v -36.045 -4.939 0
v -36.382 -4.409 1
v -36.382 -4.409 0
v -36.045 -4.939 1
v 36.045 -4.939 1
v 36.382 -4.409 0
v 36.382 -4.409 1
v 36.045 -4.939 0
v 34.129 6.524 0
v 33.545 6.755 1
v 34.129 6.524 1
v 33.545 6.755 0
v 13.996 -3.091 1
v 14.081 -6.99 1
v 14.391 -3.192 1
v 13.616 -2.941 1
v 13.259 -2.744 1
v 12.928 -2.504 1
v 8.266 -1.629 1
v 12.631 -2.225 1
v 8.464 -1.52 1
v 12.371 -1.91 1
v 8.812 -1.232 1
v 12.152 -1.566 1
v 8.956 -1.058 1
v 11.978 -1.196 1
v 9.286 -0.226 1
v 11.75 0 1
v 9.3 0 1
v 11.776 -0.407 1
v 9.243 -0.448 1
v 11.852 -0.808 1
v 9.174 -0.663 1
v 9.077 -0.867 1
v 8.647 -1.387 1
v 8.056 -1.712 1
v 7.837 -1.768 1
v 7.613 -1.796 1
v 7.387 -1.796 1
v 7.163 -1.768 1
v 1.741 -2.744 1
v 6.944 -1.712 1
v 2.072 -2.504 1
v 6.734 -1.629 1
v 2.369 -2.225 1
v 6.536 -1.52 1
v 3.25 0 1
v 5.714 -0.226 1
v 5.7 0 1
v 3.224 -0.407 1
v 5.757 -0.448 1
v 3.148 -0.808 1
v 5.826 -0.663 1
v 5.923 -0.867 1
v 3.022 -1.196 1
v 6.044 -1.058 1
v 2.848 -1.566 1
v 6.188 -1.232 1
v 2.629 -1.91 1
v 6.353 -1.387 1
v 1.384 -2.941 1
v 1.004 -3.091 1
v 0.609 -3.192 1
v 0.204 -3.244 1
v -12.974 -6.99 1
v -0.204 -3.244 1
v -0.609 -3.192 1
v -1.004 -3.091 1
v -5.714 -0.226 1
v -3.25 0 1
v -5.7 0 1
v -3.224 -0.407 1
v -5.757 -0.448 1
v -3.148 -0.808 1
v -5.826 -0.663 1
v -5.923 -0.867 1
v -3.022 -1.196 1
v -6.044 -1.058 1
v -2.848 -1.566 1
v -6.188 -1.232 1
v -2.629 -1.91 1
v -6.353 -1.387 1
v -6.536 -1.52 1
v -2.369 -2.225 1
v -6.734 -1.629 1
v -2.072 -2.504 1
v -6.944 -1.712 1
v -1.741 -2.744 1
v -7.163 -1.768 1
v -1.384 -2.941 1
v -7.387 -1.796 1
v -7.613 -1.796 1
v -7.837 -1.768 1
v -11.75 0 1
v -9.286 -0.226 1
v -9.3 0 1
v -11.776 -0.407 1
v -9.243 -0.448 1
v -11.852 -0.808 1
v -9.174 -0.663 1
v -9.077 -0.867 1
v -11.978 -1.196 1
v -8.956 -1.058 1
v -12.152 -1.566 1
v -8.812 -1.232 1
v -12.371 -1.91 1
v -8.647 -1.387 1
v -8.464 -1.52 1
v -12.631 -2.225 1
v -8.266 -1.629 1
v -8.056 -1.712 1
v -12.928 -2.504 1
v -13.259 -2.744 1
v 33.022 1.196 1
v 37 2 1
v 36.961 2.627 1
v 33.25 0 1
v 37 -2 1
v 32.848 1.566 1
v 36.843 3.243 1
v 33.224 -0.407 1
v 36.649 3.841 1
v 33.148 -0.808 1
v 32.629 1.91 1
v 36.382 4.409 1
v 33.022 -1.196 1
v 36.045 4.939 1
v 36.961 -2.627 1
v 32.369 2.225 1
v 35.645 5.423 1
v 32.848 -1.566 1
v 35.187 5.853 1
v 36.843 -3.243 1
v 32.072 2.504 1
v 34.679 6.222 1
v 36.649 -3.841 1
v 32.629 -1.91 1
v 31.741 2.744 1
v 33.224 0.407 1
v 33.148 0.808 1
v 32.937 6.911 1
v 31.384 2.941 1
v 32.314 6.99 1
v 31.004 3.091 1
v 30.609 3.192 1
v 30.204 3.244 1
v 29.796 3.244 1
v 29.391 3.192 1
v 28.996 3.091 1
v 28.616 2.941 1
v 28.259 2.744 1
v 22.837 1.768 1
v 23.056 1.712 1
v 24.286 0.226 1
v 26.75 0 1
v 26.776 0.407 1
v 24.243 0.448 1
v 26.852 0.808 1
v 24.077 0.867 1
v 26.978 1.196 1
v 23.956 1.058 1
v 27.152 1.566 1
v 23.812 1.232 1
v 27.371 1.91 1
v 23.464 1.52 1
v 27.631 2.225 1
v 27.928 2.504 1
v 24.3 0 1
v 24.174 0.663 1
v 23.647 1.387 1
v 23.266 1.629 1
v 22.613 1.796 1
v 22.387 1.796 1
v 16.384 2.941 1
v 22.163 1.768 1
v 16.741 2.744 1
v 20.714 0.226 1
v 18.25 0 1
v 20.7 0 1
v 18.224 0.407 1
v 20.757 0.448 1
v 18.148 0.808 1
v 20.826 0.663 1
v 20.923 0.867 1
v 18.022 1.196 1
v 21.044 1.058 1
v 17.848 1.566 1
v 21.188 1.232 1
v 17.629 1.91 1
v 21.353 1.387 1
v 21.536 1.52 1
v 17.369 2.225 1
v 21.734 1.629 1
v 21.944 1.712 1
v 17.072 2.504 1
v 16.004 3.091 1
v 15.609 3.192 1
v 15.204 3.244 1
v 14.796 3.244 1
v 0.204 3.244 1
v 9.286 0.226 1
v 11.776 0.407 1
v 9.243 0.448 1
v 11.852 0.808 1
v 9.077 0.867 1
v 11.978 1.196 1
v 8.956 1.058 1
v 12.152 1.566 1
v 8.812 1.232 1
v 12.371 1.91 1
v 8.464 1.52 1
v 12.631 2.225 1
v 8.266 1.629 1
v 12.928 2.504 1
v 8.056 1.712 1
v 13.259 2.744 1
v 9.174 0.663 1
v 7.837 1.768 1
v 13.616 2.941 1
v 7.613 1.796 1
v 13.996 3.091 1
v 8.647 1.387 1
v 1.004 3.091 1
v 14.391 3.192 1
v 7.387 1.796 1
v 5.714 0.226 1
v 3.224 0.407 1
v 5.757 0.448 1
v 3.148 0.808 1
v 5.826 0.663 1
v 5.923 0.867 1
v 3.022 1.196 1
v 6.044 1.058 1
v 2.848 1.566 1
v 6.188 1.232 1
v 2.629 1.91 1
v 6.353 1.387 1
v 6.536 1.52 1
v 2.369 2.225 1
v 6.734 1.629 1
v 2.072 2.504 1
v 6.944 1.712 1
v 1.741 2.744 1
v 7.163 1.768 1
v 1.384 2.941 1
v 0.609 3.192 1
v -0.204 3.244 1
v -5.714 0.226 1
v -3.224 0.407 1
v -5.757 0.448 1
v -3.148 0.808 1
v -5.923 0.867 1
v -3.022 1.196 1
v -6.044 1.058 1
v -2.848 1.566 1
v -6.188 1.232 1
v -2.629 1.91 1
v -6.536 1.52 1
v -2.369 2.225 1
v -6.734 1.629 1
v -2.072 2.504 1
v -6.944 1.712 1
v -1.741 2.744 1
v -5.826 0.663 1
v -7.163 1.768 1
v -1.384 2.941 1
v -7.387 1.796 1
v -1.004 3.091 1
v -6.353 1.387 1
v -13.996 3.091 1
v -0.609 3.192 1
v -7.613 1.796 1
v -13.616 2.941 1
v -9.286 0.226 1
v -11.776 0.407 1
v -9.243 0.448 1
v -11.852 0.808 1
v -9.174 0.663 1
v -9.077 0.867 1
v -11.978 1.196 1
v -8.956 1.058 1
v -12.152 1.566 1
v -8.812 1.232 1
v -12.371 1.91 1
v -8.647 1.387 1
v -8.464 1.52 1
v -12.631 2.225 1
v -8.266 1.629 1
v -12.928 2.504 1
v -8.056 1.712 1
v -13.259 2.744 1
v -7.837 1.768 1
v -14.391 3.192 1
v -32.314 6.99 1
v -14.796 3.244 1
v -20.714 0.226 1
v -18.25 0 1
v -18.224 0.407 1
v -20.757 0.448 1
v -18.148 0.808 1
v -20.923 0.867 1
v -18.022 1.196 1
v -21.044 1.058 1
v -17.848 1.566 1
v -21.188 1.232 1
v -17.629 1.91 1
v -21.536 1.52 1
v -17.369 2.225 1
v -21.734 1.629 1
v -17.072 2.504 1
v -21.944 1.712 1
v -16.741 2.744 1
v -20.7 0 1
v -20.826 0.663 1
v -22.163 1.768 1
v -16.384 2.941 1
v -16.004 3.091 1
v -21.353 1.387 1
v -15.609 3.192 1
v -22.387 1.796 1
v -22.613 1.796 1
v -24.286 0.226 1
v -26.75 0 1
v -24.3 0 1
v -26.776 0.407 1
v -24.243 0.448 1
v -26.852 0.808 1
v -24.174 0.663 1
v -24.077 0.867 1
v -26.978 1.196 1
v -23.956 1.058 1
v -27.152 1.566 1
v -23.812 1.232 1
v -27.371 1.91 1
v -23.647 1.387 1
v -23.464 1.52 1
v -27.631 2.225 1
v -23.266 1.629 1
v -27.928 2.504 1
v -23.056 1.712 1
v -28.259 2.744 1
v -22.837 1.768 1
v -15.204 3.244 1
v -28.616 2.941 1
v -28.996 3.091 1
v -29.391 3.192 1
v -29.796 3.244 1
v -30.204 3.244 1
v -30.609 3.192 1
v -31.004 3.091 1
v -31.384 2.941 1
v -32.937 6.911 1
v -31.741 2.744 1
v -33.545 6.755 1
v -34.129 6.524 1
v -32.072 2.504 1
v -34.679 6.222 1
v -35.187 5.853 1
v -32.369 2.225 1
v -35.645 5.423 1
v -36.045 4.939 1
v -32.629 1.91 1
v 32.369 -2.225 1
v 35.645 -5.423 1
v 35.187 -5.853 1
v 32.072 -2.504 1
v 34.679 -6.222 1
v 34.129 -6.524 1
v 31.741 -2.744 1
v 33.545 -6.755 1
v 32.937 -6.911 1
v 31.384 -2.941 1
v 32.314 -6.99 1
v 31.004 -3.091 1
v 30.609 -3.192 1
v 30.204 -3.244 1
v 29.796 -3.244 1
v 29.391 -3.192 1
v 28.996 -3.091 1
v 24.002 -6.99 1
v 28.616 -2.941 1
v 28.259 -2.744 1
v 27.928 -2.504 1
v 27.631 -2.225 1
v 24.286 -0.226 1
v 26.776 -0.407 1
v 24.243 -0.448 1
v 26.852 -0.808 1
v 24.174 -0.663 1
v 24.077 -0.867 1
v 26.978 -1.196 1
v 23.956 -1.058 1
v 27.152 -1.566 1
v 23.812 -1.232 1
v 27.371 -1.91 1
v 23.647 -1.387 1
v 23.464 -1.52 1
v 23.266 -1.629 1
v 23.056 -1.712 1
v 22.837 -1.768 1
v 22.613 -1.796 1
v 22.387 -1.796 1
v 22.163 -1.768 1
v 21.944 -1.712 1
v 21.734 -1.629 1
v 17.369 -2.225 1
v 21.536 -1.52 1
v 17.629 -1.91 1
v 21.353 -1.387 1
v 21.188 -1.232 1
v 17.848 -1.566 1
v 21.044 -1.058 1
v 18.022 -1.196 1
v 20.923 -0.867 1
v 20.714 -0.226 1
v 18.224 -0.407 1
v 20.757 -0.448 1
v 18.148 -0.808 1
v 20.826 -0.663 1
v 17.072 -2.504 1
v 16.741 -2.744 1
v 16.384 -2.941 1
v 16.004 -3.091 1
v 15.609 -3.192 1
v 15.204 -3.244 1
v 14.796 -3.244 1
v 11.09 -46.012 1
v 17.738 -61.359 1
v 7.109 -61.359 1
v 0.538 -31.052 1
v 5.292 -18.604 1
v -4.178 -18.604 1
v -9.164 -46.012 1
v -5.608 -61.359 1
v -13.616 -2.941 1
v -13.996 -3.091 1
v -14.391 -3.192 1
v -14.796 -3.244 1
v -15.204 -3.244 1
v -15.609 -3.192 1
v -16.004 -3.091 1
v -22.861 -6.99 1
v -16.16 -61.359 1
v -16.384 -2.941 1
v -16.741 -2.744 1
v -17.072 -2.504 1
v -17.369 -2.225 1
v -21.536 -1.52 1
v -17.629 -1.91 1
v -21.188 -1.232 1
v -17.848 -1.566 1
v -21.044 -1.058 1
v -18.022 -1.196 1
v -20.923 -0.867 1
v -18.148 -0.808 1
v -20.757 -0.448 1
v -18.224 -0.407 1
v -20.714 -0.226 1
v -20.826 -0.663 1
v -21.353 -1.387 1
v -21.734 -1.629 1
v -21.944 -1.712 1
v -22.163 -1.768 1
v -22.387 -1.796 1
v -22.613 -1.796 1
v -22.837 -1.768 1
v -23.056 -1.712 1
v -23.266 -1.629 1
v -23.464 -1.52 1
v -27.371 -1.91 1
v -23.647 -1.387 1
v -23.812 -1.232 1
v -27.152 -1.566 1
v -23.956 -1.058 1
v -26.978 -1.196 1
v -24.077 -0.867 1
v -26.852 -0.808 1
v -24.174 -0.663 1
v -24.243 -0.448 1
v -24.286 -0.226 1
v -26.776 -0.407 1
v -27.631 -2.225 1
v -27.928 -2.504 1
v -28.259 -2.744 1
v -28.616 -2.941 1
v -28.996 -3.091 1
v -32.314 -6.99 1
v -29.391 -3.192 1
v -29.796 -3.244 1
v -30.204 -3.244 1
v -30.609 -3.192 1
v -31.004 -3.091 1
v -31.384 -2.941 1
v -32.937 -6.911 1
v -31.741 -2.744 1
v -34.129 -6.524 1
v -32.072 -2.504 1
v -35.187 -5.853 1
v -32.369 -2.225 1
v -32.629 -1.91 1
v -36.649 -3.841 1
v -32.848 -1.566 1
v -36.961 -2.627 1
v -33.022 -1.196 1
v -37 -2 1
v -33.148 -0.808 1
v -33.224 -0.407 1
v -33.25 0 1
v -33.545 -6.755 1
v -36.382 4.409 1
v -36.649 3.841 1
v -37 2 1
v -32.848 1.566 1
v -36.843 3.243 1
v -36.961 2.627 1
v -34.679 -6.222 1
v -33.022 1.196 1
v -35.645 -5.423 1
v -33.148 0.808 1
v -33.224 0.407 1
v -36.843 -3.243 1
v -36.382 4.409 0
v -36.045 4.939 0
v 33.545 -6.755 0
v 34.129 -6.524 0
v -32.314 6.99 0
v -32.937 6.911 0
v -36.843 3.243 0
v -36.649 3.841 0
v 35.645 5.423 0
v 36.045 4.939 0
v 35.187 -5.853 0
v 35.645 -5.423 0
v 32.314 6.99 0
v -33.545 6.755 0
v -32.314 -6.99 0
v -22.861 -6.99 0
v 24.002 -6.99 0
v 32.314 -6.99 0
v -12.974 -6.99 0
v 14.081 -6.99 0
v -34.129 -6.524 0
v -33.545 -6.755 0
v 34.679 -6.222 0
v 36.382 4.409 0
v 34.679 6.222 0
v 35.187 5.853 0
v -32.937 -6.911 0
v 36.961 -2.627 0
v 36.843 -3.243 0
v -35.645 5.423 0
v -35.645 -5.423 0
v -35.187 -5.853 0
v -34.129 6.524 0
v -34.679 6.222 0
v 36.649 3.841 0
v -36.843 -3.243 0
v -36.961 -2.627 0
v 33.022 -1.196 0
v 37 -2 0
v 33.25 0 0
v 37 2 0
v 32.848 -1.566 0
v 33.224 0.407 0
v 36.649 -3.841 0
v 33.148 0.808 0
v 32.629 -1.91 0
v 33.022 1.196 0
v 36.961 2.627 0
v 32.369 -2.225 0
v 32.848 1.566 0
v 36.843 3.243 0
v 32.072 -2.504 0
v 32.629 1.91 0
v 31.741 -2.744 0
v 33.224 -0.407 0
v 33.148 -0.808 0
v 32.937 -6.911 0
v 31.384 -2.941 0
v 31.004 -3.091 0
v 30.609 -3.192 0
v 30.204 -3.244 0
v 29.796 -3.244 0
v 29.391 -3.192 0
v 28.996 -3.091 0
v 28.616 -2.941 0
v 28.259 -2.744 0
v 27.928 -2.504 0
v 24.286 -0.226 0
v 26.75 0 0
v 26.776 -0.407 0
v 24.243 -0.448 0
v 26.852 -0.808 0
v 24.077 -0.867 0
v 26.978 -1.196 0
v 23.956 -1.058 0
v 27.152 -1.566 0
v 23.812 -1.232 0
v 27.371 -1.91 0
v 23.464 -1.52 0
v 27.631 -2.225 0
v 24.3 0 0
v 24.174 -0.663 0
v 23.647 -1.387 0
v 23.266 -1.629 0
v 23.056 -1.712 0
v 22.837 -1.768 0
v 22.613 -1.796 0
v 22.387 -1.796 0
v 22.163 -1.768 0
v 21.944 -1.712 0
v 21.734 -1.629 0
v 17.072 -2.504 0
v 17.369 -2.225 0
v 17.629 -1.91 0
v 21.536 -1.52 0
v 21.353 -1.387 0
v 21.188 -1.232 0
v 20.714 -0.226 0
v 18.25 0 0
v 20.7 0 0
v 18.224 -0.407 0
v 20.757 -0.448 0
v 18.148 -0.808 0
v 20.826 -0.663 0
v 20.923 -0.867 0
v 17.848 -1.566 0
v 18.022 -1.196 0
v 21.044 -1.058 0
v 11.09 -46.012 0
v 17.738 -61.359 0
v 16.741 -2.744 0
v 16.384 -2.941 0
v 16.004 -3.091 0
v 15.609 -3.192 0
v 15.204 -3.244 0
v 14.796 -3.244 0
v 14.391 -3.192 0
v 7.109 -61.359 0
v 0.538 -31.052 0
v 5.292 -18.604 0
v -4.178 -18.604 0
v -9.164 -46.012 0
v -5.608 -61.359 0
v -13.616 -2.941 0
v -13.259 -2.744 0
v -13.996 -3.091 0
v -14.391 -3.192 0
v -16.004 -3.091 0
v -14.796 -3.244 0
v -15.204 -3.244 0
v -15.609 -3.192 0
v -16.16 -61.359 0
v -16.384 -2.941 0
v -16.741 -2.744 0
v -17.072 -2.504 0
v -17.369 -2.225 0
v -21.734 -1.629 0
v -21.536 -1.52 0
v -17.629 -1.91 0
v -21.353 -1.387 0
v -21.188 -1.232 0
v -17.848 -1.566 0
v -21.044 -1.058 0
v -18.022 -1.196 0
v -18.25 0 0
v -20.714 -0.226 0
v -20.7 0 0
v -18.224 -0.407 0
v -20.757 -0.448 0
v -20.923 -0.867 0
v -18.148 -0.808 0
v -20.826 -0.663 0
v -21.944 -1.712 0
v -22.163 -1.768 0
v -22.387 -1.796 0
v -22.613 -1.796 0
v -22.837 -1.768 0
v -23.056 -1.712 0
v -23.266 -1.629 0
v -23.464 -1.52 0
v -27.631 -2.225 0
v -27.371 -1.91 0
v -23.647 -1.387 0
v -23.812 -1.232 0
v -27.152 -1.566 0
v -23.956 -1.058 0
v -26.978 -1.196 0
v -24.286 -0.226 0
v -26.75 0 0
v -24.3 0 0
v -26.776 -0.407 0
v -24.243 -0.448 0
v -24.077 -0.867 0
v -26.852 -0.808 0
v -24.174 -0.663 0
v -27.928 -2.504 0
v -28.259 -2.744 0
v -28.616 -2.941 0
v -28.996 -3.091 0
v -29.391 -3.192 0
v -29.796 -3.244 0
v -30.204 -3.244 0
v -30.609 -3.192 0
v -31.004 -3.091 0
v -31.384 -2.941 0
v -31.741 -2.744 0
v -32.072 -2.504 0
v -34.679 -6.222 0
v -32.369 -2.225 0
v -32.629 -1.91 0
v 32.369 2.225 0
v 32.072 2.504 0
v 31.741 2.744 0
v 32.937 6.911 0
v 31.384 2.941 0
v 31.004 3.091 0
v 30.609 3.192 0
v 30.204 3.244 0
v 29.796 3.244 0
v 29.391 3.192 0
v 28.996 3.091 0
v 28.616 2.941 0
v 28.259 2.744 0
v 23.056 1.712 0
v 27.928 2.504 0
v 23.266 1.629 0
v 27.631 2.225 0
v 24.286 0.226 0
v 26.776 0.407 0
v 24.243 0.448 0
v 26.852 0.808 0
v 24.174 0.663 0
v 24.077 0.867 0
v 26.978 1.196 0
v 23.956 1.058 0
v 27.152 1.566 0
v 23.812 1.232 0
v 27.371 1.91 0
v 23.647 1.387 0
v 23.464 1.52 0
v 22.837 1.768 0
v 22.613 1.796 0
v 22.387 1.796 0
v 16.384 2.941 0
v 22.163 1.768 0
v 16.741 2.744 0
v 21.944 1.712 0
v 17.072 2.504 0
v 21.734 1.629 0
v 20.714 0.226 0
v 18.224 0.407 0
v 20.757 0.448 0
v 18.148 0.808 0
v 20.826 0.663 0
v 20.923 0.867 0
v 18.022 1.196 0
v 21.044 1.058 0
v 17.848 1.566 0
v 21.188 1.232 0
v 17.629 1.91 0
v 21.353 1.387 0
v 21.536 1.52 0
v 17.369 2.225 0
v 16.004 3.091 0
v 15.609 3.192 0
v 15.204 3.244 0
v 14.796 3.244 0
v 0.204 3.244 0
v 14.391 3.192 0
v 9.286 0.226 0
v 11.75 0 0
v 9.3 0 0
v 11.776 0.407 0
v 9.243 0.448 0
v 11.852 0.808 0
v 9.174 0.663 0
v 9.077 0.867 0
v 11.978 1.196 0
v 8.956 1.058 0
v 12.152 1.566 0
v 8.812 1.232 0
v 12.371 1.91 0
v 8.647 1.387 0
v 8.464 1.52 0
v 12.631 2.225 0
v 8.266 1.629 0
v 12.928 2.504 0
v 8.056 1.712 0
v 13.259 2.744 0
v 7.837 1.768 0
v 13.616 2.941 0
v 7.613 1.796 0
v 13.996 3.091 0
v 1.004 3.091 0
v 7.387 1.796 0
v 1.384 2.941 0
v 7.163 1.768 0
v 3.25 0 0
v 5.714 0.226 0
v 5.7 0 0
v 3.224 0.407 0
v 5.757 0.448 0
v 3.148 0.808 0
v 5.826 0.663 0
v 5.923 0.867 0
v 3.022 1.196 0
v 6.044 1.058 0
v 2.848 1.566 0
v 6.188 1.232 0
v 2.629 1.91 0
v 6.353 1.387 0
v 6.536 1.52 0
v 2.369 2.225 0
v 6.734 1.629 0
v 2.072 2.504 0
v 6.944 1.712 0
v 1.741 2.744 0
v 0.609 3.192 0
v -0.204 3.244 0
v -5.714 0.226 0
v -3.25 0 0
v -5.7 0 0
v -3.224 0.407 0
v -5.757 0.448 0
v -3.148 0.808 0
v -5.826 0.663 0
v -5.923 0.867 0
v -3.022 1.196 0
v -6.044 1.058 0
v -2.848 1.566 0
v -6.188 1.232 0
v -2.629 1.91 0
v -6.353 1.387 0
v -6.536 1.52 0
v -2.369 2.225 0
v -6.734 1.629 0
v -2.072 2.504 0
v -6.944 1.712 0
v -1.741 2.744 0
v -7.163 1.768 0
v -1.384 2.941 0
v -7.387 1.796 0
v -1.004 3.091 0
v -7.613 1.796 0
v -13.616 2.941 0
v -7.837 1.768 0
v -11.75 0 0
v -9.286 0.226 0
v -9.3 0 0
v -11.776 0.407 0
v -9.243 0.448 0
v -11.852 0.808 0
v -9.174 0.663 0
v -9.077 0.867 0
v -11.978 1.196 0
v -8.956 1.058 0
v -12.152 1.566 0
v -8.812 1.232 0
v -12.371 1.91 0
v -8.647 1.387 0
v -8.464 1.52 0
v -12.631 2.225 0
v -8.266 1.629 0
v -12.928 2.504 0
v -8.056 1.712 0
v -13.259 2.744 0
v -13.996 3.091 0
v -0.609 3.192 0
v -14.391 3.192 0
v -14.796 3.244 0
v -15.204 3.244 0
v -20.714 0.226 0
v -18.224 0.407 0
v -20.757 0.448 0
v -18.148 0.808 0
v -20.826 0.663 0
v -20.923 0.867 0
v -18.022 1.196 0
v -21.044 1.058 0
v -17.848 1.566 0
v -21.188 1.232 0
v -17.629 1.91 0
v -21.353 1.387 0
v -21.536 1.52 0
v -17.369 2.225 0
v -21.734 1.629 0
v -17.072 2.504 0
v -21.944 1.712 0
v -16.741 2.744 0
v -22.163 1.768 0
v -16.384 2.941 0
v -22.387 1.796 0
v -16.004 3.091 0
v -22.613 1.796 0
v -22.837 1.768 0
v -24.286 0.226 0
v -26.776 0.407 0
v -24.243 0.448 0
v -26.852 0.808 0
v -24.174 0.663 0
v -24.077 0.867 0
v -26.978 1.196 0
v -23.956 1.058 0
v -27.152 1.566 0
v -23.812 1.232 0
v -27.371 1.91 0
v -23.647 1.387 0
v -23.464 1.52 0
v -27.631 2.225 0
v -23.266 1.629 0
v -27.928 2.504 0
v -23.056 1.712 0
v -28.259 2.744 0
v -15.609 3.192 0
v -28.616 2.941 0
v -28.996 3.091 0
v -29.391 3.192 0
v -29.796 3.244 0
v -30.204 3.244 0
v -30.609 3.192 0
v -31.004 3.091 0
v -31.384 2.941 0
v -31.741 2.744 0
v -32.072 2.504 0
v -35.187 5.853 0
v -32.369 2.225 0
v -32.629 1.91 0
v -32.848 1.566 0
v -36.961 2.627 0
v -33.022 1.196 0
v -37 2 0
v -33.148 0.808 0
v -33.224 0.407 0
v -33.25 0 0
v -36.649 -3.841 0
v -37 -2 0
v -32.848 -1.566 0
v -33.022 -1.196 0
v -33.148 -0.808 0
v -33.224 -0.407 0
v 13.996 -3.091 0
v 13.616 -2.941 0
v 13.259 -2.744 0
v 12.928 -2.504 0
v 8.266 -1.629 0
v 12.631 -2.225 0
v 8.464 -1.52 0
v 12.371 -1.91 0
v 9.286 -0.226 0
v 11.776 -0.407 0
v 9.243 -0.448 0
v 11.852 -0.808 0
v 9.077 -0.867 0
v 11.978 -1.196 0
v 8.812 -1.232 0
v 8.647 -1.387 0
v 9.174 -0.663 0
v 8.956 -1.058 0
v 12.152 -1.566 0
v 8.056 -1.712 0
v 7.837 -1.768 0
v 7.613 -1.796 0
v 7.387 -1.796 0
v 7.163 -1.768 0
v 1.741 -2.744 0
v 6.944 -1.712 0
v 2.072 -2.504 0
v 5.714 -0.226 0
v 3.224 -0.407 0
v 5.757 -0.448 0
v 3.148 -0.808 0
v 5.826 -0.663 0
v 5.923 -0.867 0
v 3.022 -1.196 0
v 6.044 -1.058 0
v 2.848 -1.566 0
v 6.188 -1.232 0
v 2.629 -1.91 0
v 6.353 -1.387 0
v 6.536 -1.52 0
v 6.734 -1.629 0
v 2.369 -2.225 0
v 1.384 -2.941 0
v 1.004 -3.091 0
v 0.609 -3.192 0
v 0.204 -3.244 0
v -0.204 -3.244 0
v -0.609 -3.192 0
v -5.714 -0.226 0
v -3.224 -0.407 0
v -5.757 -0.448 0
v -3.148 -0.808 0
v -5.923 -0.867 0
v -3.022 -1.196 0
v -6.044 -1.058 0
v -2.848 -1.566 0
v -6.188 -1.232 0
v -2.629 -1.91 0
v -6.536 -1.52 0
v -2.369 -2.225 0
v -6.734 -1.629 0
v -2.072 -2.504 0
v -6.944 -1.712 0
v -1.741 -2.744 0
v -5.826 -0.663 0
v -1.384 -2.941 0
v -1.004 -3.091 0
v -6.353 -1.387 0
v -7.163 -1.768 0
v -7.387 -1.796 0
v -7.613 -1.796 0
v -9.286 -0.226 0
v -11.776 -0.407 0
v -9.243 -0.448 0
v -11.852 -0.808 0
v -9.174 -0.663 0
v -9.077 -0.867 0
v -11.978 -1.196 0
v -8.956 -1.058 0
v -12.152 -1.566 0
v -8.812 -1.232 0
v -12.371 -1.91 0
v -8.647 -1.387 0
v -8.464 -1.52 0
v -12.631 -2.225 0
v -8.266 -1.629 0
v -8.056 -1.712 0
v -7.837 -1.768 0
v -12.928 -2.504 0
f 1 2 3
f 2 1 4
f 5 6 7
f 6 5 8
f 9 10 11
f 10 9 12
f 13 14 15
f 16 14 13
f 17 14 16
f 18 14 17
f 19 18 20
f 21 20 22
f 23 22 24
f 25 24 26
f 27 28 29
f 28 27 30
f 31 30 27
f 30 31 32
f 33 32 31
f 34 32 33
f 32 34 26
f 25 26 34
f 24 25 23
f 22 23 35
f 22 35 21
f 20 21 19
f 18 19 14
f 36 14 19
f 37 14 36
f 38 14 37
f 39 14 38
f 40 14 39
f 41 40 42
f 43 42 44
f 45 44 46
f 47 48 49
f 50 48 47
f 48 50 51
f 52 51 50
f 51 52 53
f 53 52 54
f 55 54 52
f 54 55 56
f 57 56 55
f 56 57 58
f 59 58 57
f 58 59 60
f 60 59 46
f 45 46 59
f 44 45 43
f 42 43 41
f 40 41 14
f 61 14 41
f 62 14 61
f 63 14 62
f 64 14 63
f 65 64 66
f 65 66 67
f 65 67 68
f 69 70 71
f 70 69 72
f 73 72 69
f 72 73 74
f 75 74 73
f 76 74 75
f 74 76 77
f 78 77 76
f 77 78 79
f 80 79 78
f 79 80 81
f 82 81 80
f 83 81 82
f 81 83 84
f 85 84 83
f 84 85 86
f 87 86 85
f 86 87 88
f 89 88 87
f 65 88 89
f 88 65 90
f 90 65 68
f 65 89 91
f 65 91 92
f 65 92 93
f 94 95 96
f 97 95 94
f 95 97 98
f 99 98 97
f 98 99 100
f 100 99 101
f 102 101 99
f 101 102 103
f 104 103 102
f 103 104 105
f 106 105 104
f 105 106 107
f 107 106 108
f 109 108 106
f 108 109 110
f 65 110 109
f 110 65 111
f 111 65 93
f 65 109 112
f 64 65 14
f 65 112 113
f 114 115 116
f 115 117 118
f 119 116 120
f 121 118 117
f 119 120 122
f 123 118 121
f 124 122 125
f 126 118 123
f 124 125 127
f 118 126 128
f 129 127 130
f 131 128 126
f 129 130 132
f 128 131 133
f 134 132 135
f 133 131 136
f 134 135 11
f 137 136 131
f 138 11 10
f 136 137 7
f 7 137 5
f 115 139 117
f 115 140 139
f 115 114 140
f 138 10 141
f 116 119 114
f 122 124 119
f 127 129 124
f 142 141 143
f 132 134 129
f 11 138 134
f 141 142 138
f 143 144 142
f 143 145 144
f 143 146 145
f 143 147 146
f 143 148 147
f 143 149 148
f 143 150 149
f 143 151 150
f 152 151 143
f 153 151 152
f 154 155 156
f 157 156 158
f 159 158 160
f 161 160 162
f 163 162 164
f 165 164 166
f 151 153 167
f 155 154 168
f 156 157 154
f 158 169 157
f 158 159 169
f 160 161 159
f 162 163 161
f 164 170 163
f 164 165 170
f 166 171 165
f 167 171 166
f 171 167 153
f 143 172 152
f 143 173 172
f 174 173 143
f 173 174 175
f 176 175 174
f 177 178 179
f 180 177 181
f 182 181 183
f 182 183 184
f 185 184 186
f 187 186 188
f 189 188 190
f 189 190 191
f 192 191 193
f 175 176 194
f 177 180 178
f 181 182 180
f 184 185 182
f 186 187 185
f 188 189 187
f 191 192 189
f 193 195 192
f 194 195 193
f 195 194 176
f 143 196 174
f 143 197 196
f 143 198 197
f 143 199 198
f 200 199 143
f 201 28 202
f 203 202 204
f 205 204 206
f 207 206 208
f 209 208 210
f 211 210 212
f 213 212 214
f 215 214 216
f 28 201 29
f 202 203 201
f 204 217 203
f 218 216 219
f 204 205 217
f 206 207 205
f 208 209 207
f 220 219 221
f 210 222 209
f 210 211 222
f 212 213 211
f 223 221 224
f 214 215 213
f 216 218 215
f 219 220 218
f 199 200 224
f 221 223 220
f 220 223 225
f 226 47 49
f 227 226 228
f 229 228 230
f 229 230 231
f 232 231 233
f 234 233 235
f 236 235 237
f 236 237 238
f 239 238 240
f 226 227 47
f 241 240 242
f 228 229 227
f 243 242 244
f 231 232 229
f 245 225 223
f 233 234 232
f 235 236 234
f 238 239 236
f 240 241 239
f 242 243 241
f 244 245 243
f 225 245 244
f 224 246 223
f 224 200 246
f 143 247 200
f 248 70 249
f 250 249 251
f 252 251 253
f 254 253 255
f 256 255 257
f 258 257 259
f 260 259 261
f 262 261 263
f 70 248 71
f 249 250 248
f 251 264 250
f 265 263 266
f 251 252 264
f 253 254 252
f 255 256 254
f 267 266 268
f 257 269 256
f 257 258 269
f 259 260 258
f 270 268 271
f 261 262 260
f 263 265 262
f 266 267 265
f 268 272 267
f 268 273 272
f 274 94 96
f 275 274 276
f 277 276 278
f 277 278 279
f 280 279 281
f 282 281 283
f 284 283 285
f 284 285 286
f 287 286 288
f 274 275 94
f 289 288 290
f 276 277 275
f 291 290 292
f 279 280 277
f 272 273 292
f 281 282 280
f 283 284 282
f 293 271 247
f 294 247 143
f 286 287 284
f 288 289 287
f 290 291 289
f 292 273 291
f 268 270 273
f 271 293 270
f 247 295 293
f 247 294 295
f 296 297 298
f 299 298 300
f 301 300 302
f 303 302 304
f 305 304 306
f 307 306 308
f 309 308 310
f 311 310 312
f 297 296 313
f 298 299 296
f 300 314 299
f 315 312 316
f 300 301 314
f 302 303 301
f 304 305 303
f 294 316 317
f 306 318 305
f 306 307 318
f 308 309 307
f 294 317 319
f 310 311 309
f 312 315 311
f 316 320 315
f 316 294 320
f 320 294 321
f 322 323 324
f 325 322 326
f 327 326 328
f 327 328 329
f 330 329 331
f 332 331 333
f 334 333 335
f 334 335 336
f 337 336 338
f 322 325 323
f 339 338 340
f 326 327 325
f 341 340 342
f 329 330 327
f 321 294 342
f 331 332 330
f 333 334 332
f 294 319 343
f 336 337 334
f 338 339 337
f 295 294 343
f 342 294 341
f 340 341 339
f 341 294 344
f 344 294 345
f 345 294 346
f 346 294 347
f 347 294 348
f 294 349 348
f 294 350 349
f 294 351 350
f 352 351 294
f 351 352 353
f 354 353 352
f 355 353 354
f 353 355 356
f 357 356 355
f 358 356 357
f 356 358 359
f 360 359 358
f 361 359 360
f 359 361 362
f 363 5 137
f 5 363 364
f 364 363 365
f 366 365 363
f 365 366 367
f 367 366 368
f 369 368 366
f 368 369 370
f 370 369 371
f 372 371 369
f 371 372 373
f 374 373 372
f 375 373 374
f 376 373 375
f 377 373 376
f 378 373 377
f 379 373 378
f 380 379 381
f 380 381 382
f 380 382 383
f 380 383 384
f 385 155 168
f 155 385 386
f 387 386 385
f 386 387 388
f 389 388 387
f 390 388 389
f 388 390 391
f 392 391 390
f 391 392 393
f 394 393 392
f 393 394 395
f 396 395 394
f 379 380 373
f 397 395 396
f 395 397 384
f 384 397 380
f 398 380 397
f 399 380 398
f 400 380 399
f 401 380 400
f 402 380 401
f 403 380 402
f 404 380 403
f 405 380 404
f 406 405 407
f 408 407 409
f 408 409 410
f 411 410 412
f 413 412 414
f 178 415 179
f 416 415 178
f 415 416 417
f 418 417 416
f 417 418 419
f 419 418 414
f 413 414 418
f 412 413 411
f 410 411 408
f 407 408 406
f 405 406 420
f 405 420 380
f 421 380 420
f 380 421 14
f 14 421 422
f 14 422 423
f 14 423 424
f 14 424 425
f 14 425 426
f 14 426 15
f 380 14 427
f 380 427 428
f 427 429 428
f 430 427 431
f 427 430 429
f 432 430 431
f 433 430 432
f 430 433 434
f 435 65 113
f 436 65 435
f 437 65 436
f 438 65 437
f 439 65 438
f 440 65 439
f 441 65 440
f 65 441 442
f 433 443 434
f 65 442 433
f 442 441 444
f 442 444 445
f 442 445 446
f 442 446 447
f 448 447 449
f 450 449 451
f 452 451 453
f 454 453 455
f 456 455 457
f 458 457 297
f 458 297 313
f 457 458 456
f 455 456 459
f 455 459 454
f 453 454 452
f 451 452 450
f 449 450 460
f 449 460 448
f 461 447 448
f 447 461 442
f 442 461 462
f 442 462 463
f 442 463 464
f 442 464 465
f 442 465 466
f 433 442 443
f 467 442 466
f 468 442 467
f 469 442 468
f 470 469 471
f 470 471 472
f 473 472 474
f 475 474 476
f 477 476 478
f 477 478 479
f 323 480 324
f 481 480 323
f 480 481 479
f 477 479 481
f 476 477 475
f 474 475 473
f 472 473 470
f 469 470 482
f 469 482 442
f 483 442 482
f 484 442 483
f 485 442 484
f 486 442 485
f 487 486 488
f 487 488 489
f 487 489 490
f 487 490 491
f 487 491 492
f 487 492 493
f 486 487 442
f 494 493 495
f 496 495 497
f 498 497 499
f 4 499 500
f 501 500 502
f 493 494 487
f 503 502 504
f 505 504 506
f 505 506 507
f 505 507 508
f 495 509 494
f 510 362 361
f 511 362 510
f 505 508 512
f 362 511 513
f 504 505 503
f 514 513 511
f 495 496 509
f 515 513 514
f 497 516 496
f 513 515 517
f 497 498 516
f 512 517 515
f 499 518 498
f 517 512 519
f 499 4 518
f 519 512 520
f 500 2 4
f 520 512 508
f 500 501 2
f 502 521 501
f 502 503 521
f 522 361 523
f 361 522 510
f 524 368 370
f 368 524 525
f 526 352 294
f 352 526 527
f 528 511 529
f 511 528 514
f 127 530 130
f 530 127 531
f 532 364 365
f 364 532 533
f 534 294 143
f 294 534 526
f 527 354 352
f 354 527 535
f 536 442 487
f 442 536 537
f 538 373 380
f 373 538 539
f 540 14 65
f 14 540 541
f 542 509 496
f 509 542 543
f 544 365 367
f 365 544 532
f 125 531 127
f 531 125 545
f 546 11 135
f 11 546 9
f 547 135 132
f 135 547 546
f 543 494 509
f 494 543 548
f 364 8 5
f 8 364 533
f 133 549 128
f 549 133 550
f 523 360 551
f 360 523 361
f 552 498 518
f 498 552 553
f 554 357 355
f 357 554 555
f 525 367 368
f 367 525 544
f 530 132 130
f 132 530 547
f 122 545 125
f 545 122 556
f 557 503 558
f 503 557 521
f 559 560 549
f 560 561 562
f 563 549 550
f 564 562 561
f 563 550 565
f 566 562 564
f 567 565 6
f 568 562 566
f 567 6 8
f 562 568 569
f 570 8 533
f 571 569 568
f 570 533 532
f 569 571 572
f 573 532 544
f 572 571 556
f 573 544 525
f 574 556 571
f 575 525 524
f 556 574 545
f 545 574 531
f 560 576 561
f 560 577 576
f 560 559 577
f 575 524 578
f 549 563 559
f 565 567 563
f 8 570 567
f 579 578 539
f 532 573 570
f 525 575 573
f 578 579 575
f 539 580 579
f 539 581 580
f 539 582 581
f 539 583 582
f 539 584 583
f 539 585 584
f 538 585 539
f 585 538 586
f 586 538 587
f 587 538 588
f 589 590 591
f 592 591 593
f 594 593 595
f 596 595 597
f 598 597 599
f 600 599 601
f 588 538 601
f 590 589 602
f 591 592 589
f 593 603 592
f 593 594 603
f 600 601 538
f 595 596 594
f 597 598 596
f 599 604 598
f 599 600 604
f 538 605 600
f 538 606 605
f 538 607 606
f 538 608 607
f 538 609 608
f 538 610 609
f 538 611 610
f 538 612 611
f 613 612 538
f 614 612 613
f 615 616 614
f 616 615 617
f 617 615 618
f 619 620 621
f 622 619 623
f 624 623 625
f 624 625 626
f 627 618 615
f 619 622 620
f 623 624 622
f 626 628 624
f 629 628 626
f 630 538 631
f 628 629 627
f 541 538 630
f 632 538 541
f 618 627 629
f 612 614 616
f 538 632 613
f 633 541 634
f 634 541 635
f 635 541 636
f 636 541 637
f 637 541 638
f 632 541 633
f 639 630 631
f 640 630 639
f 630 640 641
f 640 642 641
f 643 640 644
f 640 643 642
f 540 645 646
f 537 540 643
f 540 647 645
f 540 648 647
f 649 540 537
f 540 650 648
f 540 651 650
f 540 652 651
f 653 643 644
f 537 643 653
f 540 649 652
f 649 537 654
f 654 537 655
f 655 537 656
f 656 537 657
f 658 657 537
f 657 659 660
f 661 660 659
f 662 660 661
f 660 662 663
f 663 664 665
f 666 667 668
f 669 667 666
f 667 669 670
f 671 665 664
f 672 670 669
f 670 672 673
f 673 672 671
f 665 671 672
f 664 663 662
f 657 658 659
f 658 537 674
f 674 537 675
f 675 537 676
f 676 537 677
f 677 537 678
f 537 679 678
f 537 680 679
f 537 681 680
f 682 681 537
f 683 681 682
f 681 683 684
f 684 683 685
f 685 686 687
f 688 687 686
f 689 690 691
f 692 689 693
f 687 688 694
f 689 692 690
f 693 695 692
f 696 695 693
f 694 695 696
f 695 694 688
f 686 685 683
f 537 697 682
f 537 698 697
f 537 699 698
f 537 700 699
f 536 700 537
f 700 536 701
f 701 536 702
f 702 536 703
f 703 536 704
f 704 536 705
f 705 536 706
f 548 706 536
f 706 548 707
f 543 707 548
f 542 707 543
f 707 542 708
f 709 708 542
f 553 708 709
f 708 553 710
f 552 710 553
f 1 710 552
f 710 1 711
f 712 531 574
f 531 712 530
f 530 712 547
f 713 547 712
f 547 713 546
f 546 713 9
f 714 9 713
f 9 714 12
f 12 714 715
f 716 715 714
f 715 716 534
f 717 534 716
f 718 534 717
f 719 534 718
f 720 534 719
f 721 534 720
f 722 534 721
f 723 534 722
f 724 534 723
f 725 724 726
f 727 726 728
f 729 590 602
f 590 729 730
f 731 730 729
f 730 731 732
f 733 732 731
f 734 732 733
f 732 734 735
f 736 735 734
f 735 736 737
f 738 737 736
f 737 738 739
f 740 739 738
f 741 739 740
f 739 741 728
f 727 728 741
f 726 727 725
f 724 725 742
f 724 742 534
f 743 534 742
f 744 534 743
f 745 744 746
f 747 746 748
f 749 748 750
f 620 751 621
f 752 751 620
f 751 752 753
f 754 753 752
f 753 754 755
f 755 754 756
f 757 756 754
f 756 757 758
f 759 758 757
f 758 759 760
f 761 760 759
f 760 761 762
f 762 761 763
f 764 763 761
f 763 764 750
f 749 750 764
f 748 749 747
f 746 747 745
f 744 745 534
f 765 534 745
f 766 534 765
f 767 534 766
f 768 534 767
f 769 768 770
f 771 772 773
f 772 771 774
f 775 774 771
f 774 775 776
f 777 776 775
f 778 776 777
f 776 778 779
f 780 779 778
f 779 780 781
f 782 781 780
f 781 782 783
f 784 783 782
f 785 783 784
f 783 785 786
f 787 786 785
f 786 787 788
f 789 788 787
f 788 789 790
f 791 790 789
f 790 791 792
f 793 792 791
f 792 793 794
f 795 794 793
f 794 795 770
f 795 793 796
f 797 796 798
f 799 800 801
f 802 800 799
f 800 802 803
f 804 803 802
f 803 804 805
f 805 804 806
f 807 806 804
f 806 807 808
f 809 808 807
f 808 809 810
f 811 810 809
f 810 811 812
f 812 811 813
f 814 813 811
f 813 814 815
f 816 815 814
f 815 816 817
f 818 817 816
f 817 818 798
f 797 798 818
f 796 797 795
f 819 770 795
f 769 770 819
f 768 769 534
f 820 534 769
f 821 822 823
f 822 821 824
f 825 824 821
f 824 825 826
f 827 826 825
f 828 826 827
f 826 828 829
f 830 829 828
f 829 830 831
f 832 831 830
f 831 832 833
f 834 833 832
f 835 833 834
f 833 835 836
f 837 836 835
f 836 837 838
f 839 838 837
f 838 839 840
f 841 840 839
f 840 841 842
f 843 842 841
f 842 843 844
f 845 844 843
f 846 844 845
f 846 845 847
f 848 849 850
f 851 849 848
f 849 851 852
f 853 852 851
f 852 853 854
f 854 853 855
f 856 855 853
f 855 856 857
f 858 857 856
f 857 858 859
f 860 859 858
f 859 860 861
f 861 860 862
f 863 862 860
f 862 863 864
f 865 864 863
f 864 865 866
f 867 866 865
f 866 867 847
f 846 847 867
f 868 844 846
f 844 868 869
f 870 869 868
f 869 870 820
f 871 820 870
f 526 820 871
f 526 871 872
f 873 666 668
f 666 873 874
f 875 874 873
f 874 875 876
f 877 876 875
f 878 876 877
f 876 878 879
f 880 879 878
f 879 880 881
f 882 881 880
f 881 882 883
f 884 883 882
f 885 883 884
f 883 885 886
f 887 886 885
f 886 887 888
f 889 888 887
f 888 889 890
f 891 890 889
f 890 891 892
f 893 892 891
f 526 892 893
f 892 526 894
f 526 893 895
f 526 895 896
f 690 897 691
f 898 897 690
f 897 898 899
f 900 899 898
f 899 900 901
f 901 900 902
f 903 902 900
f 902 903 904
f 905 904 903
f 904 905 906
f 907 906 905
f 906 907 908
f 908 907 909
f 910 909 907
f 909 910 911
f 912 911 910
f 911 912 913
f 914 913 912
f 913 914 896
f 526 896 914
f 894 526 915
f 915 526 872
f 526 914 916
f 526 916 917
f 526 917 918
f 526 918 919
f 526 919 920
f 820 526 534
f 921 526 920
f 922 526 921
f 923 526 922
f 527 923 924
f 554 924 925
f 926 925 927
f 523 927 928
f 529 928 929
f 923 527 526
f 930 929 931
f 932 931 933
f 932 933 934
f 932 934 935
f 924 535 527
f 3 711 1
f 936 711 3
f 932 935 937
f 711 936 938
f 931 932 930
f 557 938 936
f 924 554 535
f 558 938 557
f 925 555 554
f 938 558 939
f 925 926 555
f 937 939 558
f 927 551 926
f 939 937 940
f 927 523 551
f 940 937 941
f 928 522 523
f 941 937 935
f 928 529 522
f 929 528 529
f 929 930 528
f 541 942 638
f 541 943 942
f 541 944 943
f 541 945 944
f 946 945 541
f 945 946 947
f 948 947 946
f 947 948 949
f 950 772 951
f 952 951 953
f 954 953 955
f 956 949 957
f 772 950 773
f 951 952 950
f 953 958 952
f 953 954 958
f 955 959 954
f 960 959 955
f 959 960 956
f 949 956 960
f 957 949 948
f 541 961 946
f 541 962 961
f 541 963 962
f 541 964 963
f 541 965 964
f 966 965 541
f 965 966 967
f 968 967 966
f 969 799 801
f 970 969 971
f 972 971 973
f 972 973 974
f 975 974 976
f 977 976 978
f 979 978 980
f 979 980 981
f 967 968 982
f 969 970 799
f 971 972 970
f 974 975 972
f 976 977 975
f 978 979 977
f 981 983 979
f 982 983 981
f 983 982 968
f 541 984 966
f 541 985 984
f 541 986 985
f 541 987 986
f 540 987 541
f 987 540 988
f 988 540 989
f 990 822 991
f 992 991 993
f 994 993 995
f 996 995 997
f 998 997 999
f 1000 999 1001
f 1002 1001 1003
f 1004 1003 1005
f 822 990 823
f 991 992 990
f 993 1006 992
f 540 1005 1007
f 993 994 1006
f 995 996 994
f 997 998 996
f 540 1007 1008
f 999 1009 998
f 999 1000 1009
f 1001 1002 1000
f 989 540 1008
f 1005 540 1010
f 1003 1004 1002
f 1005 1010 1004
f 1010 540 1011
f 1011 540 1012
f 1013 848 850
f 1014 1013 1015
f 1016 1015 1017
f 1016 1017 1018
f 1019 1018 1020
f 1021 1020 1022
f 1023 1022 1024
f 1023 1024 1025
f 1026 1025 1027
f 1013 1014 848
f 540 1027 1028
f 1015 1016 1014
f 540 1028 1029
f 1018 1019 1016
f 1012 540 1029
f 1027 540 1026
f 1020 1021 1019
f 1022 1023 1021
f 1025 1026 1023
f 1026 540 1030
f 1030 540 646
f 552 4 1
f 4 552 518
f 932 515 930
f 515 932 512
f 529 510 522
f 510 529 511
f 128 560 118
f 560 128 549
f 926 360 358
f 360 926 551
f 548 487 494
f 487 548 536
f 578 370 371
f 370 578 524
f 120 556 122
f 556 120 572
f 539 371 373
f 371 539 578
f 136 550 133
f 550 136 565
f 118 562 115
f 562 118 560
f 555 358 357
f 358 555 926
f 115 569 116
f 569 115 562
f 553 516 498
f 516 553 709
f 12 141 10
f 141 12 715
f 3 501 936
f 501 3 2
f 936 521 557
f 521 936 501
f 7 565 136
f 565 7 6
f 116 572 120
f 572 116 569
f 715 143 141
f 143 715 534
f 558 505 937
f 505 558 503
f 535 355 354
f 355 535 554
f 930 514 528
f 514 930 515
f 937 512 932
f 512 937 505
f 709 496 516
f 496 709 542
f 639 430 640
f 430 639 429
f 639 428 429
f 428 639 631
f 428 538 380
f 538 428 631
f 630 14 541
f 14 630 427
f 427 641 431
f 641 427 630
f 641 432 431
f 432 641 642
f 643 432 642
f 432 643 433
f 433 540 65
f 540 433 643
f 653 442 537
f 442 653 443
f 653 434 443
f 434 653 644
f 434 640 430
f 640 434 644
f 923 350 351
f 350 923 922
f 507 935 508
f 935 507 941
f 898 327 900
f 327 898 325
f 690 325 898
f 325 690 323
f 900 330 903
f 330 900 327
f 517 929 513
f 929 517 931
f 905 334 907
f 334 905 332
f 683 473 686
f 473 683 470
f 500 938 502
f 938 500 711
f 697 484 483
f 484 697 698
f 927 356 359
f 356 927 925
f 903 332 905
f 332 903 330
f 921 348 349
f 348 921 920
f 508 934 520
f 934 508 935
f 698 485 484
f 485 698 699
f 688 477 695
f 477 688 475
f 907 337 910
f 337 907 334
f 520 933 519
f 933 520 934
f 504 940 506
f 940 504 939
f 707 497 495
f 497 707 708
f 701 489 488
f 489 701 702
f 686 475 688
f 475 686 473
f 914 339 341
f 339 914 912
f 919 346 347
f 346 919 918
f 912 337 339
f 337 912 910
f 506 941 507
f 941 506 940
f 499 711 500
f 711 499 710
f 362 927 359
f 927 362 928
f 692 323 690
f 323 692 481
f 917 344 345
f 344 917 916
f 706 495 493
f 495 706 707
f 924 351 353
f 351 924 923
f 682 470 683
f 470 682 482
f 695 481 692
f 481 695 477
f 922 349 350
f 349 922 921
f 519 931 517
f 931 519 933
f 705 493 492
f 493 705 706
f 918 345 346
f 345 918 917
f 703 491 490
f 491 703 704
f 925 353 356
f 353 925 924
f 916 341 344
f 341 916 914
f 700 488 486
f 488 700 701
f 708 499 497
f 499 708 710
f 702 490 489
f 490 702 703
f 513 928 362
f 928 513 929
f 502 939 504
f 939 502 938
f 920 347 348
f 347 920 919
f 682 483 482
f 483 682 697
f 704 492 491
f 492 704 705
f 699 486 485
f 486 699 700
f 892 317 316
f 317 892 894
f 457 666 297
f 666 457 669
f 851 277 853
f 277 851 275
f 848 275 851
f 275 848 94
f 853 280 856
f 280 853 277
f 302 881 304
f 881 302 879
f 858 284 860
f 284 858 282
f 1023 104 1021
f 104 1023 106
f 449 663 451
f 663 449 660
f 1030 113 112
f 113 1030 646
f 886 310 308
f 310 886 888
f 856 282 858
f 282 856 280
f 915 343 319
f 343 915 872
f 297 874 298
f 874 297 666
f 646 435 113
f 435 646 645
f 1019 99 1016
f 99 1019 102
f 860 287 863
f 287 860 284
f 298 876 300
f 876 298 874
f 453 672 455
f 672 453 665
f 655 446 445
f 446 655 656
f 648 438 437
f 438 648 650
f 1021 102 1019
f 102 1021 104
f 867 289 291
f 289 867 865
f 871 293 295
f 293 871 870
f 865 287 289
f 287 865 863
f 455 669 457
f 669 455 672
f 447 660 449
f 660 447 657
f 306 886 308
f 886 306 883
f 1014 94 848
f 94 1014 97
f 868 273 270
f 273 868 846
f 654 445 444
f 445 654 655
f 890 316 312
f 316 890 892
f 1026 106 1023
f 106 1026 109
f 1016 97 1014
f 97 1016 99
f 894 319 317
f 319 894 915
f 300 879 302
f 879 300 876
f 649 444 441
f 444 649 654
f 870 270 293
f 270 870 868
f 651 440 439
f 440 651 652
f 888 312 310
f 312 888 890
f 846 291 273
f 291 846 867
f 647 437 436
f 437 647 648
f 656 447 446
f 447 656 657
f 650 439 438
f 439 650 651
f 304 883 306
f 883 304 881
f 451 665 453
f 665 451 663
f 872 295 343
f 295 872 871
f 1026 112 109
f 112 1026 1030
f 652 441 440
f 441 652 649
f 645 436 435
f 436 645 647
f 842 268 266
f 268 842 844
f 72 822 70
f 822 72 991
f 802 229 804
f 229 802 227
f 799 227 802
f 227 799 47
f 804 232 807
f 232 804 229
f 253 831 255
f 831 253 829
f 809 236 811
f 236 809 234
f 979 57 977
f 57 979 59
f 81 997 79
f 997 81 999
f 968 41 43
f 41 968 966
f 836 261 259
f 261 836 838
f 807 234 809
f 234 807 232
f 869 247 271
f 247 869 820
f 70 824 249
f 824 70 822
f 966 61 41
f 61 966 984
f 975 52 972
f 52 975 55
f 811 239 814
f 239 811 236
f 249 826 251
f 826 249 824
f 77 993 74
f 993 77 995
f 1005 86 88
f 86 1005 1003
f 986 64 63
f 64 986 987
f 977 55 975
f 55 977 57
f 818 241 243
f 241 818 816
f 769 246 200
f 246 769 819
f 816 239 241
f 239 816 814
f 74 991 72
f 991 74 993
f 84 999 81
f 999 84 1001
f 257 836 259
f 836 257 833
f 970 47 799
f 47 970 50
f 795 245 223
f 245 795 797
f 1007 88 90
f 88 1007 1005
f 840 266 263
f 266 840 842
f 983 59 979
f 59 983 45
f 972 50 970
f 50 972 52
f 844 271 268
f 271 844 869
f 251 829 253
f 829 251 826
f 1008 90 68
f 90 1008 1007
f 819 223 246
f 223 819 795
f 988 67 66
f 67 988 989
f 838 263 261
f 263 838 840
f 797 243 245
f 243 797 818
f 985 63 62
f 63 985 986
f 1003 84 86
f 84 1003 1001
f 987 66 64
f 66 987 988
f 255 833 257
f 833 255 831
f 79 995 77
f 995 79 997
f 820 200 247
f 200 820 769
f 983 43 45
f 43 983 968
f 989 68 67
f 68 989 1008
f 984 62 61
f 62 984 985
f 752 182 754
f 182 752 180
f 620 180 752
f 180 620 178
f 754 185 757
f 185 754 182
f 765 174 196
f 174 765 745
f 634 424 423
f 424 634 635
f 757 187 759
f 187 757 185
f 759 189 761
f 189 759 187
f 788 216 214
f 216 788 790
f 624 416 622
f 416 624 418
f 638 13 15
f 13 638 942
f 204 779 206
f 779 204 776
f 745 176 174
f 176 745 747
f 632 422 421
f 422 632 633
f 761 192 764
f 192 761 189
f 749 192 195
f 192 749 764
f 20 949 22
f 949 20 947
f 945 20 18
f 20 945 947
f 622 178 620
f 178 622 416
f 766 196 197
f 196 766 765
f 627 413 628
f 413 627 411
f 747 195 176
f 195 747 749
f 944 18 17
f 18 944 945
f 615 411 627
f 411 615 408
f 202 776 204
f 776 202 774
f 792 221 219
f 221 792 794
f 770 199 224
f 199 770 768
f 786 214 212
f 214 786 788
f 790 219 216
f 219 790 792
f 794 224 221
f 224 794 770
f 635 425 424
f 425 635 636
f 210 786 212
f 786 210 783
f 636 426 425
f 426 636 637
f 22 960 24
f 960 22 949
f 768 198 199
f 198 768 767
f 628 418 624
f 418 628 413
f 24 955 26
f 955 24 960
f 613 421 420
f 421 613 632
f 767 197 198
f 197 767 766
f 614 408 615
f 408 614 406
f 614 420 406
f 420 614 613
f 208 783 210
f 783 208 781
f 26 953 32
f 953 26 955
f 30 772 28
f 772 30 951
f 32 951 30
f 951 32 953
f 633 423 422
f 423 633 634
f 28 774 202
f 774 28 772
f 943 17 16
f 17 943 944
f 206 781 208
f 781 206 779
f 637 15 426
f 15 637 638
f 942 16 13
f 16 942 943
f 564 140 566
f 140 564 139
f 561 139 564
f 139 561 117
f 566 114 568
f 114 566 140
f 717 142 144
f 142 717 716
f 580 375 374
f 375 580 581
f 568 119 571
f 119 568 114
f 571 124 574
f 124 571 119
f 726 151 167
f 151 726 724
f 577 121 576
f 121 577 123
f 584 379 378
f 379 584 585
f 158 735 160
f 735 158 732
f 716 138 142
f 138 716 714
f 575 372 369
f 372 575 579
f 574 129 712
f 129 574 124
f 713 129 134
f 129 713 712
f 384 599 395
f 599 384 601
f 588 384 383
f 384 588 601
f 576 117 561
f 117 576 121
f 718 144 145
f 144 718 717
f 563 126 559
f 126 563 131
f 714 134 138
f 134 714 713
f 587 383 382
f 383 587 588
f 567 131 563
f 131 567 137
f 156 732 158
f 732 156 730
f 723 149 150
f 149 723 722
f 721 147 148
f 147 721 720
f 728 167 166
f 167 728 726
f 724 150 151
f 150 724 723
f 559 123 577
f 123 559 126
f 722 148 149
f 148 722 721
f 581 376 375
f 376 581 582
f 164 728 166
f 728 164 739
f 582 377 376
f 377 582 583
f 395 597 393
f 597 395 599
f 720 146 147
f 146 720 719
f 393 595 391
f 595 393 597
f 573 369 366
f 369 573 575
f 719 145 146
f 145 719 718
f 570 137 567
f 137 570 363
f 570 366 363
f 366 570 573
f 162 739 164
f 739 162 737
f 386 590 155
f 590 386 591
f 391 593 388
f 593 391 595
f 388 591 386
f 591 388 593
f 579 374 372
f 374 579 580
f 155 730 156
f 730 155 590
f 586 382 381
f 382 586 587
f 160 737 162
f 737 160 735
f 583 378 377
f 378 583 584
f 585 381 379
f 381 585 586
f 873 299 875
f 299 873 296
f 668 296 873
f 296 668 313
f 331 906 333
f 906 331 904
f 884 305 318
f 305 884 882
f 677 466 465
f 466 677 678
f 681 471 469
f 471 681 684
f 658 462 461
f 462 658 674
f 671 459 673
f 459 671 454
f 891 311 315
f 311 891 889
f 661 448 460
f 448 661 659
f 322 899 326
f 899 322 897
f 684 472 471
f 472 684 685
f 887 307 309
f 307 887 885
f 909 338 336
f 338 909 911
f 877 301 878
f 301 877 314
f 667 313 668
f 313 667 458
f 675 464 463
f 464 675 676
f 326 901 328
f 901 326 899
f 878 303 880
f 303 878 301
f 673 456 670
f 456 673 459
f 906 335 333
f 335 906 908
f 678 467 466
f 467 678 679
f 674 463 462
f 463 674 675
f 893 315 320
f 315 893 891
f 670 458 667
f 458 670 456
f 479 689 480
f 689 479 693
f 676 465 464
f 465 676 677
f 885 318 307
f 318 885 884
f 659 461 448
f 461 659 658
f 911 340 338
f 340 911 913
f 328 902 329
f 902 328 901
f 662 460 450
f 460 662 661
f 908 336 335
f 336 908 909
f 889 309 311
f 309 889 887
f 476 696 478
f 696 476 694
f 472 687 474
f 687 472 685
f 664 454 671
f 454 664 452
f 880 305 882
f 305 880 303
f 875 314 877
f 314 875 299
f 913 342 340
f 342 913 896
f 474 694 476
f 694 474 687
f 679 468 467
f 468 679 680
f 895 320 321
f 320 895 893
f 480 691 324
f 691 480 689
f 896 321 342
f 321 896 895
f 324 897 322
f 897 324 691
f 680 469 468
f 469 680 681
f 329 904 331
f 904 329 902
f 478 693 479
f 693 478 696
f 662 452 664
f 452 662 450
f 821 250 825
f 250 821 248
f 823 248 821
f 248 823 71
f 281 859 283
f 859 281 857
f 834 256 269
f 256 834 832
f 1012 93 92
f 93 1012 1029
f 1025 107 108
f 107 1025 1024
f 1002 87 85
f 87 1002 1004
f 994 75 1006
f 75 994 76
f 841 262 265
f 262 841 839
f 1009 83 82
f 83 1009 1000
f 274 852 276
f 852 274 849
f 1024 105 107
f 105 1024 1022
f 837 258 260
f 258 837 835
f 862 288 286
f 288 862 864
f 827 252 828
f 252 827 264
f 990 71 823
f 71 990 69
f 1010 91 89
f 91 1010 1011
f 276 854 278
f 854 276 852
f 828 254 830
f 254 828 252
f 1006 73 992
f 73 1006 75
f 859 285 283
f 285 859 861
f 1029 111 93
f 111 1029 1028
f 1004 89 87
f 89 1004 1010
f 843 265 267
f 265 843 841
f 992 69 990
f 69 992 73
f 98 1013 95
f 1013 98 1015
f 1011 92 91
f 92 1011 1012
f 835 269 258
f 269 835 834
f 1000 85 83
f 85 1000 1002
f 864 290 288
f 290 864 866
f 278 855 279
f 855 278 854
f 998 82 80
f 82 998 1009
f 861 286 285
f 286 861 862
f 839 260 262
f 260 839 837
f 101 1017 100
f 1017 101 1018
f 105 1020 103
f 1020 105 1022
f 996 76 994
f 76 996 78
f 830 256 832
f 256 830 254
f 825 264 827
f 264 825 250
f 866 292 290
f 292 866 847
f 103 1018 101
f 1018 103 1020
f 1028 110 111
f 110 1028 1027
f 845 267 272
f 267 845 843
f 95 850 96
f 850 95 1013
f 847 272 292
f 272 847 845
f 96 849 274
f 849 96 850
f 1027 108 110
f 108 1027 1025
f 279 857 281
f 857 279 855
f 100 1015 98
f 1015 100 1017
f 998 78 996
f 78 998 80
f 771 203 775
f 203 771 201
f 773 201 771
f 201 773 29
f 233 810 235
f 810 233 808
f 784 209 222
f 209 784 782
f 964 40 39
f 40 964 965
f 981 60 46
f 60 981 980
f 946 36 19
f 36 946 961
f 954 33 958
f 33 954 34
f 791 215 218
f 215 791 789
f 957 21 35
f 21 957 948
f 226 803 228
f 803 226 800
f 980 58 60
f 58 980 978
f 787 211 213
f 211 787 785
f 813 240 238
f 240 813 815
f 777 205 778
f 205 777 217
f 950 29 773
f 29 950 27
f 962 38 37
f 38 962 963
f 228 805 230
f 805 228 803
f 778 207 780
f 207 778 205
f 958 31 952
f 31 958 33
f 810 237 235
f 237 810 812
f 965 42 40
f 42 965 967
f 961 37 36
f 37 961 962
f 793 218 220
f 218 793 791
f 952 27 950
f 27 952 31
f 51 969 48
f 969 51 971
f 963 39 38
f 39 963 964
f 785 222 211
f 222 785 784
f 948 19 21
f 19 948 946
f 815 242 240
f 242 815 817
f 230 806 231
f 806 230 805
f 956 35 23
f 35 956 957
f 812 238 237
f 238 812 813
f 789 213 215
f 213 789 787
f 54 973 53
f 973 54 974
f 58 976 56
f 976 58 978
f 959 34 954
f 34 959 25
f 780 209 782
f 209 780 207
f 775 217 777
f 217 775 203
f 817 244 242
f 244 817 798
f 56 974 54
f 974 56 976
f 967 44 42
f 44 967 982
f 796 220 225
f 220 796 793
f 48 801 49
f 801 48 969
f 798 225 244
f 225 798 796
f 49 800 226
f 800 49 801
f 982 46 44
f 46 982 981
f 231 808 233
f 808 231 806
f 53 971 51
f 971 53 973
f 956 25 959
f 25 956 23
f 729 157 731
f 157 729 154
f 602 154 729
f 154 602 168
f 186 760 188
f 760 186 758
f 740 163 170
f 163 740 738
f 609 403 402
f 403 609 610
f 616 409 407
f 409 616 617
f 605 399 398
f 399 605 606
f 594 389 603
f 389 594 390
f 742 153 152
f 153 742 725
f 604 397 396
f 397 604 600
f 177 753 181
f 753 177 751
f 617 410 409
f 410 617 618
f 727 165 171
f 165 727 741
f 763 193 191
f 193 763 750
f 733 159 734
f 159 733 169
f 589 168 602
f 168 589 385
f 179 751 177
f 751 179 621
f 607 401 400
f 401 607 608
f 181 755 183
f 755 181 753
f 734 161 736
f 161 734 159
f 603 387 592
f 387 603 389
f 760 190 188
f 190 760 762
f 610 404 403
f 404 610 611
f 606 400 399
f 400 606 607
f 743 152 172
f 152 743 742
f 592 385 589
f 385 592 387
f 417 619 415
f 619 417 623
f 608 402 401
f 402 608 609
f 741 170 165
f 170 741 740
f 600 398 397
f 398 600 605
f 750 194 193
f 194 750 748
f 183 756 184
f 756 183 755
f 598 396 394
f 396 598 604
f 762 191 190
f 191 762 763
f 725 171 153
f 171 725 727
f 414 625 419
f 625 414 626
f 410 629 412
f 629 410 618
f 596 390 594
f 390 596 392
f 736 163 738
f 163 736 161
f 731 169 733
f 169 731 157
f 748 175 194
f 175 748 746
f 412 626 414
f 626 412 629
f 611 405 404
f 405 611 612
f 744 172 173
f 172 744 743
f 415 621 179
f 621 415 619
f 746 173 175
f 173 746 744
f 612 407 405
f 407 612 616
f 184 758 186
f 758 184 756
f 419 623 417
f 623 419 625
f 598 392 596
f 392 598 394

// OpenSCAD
$fn = 50;


difference() {
	union() {
		hull() {
			translate(v = [-32.0000000000, 2.0000000000, 0]) {
				cylinder(h = 1, r = 5);
			}
			translate(v = [32.0000000000, 2.0000000000, 0]) {
				cylinder(h = 1, r = 5);
			}
			translate(v = [-32.0000000000, -2.0000000000, 0]) {
				cylinder(h = 1, r = 5);
			}
			translate(v = [32.0000000000, -2.0000000000, 0]) {
				cylinder(h = 1, r = 5);
			}
		}
		translate(v = [0, -5, 0]) {
			linear_extrude(height = 1) {
				text(font = "DejaVu Sans Mono:style=Bold", halign = "center", size = 57.0000000000, text = "W", valign = "top");
			}
		}
	}
	union() {
		translate(v = [-30.0000000000, 0.0000000000, 0]) {
			translate(v = [0, 0, -100]) {
				cylinder(h = 200, r = 3.2500000000);
			}
		}
		translate(v = [-15.0000000000, 0.0000000000, 0]) {
			translate(v = [0, 0, -100]) {
				cylinder(h = 200, r = 3.2500000000);
			}
		}
		translate(v = [0, 0, -100]) {
			cylinder(h = 200, r = 3.2500000000);
		}
		translate(v = [15.0000000000, 0.0000000000, 0]) {
			translate(v = [0, 0, -100]) {
				cylinder(h = 200, r = 3.2500000000);
			}
		}
		translate(v = [30.0000000000, 0.0000000000, 0]) {
			translate(v = [0, 0, -100]) {
				cylinder(h = 200, r = 3.2500000000);
			}
		}
		translate(v = [-30.0000000000, 0.0000000000, 0]) {
			translate(v = [0, 0, -100]) {
				cylinder(h = 200, r = 1.8000000000);
			}
		}
		translate(v = [-22.5000000000, 0.0000000000, 0]) {
			translate(v = [0, 0, -100]) {
				cylinder(h = 200, r = 1.8000000000);
			}
		}
		translate(v = [-15.0000000000, 0.0000000000, 0]) {
			translate(v = [0, 0, -100]) {
				cylinder(h = 200, r = 1.8000000000);
			}
		}
		translate(v = [-7.5000000000, 0.0000000000, 0]) {
			translate(v = [0, 0, -100]) {
				cylinder(h = 200, r = 1.8000000000);
			}
		}
		translate(v = [0, 0, -100]) {
			cylinder(h = 200, r = 1.8000000000);
		}
		translate(v = [7.5000000000, 0.0000000000, 0]) {
			translate(v = [0, 0, -100]) {
				cylinder(h = 200, r = 1.8000000000);
			}
		}
		translate(v = [15.0000000000, 0.0000000000, 0]) {
			translate(v = [0, 0, -100]) {
				cylinder(h = 200, r = 1.8000000000);
			}
		}
		translate(v = [22.5000000000, 0.0000000000, 0]) {
			translate(v = [0, 0, -100]) {
				cylinder(h = 200, r = 1.8000000000);
			}
		}
		translate(v = [30.0000000000, 0.0000000000, 0]) {
			translate(v = [0, 0, -100]) {
				cylinder(h = 200, r = 1.8000000000);
			}
		}
	}
}
